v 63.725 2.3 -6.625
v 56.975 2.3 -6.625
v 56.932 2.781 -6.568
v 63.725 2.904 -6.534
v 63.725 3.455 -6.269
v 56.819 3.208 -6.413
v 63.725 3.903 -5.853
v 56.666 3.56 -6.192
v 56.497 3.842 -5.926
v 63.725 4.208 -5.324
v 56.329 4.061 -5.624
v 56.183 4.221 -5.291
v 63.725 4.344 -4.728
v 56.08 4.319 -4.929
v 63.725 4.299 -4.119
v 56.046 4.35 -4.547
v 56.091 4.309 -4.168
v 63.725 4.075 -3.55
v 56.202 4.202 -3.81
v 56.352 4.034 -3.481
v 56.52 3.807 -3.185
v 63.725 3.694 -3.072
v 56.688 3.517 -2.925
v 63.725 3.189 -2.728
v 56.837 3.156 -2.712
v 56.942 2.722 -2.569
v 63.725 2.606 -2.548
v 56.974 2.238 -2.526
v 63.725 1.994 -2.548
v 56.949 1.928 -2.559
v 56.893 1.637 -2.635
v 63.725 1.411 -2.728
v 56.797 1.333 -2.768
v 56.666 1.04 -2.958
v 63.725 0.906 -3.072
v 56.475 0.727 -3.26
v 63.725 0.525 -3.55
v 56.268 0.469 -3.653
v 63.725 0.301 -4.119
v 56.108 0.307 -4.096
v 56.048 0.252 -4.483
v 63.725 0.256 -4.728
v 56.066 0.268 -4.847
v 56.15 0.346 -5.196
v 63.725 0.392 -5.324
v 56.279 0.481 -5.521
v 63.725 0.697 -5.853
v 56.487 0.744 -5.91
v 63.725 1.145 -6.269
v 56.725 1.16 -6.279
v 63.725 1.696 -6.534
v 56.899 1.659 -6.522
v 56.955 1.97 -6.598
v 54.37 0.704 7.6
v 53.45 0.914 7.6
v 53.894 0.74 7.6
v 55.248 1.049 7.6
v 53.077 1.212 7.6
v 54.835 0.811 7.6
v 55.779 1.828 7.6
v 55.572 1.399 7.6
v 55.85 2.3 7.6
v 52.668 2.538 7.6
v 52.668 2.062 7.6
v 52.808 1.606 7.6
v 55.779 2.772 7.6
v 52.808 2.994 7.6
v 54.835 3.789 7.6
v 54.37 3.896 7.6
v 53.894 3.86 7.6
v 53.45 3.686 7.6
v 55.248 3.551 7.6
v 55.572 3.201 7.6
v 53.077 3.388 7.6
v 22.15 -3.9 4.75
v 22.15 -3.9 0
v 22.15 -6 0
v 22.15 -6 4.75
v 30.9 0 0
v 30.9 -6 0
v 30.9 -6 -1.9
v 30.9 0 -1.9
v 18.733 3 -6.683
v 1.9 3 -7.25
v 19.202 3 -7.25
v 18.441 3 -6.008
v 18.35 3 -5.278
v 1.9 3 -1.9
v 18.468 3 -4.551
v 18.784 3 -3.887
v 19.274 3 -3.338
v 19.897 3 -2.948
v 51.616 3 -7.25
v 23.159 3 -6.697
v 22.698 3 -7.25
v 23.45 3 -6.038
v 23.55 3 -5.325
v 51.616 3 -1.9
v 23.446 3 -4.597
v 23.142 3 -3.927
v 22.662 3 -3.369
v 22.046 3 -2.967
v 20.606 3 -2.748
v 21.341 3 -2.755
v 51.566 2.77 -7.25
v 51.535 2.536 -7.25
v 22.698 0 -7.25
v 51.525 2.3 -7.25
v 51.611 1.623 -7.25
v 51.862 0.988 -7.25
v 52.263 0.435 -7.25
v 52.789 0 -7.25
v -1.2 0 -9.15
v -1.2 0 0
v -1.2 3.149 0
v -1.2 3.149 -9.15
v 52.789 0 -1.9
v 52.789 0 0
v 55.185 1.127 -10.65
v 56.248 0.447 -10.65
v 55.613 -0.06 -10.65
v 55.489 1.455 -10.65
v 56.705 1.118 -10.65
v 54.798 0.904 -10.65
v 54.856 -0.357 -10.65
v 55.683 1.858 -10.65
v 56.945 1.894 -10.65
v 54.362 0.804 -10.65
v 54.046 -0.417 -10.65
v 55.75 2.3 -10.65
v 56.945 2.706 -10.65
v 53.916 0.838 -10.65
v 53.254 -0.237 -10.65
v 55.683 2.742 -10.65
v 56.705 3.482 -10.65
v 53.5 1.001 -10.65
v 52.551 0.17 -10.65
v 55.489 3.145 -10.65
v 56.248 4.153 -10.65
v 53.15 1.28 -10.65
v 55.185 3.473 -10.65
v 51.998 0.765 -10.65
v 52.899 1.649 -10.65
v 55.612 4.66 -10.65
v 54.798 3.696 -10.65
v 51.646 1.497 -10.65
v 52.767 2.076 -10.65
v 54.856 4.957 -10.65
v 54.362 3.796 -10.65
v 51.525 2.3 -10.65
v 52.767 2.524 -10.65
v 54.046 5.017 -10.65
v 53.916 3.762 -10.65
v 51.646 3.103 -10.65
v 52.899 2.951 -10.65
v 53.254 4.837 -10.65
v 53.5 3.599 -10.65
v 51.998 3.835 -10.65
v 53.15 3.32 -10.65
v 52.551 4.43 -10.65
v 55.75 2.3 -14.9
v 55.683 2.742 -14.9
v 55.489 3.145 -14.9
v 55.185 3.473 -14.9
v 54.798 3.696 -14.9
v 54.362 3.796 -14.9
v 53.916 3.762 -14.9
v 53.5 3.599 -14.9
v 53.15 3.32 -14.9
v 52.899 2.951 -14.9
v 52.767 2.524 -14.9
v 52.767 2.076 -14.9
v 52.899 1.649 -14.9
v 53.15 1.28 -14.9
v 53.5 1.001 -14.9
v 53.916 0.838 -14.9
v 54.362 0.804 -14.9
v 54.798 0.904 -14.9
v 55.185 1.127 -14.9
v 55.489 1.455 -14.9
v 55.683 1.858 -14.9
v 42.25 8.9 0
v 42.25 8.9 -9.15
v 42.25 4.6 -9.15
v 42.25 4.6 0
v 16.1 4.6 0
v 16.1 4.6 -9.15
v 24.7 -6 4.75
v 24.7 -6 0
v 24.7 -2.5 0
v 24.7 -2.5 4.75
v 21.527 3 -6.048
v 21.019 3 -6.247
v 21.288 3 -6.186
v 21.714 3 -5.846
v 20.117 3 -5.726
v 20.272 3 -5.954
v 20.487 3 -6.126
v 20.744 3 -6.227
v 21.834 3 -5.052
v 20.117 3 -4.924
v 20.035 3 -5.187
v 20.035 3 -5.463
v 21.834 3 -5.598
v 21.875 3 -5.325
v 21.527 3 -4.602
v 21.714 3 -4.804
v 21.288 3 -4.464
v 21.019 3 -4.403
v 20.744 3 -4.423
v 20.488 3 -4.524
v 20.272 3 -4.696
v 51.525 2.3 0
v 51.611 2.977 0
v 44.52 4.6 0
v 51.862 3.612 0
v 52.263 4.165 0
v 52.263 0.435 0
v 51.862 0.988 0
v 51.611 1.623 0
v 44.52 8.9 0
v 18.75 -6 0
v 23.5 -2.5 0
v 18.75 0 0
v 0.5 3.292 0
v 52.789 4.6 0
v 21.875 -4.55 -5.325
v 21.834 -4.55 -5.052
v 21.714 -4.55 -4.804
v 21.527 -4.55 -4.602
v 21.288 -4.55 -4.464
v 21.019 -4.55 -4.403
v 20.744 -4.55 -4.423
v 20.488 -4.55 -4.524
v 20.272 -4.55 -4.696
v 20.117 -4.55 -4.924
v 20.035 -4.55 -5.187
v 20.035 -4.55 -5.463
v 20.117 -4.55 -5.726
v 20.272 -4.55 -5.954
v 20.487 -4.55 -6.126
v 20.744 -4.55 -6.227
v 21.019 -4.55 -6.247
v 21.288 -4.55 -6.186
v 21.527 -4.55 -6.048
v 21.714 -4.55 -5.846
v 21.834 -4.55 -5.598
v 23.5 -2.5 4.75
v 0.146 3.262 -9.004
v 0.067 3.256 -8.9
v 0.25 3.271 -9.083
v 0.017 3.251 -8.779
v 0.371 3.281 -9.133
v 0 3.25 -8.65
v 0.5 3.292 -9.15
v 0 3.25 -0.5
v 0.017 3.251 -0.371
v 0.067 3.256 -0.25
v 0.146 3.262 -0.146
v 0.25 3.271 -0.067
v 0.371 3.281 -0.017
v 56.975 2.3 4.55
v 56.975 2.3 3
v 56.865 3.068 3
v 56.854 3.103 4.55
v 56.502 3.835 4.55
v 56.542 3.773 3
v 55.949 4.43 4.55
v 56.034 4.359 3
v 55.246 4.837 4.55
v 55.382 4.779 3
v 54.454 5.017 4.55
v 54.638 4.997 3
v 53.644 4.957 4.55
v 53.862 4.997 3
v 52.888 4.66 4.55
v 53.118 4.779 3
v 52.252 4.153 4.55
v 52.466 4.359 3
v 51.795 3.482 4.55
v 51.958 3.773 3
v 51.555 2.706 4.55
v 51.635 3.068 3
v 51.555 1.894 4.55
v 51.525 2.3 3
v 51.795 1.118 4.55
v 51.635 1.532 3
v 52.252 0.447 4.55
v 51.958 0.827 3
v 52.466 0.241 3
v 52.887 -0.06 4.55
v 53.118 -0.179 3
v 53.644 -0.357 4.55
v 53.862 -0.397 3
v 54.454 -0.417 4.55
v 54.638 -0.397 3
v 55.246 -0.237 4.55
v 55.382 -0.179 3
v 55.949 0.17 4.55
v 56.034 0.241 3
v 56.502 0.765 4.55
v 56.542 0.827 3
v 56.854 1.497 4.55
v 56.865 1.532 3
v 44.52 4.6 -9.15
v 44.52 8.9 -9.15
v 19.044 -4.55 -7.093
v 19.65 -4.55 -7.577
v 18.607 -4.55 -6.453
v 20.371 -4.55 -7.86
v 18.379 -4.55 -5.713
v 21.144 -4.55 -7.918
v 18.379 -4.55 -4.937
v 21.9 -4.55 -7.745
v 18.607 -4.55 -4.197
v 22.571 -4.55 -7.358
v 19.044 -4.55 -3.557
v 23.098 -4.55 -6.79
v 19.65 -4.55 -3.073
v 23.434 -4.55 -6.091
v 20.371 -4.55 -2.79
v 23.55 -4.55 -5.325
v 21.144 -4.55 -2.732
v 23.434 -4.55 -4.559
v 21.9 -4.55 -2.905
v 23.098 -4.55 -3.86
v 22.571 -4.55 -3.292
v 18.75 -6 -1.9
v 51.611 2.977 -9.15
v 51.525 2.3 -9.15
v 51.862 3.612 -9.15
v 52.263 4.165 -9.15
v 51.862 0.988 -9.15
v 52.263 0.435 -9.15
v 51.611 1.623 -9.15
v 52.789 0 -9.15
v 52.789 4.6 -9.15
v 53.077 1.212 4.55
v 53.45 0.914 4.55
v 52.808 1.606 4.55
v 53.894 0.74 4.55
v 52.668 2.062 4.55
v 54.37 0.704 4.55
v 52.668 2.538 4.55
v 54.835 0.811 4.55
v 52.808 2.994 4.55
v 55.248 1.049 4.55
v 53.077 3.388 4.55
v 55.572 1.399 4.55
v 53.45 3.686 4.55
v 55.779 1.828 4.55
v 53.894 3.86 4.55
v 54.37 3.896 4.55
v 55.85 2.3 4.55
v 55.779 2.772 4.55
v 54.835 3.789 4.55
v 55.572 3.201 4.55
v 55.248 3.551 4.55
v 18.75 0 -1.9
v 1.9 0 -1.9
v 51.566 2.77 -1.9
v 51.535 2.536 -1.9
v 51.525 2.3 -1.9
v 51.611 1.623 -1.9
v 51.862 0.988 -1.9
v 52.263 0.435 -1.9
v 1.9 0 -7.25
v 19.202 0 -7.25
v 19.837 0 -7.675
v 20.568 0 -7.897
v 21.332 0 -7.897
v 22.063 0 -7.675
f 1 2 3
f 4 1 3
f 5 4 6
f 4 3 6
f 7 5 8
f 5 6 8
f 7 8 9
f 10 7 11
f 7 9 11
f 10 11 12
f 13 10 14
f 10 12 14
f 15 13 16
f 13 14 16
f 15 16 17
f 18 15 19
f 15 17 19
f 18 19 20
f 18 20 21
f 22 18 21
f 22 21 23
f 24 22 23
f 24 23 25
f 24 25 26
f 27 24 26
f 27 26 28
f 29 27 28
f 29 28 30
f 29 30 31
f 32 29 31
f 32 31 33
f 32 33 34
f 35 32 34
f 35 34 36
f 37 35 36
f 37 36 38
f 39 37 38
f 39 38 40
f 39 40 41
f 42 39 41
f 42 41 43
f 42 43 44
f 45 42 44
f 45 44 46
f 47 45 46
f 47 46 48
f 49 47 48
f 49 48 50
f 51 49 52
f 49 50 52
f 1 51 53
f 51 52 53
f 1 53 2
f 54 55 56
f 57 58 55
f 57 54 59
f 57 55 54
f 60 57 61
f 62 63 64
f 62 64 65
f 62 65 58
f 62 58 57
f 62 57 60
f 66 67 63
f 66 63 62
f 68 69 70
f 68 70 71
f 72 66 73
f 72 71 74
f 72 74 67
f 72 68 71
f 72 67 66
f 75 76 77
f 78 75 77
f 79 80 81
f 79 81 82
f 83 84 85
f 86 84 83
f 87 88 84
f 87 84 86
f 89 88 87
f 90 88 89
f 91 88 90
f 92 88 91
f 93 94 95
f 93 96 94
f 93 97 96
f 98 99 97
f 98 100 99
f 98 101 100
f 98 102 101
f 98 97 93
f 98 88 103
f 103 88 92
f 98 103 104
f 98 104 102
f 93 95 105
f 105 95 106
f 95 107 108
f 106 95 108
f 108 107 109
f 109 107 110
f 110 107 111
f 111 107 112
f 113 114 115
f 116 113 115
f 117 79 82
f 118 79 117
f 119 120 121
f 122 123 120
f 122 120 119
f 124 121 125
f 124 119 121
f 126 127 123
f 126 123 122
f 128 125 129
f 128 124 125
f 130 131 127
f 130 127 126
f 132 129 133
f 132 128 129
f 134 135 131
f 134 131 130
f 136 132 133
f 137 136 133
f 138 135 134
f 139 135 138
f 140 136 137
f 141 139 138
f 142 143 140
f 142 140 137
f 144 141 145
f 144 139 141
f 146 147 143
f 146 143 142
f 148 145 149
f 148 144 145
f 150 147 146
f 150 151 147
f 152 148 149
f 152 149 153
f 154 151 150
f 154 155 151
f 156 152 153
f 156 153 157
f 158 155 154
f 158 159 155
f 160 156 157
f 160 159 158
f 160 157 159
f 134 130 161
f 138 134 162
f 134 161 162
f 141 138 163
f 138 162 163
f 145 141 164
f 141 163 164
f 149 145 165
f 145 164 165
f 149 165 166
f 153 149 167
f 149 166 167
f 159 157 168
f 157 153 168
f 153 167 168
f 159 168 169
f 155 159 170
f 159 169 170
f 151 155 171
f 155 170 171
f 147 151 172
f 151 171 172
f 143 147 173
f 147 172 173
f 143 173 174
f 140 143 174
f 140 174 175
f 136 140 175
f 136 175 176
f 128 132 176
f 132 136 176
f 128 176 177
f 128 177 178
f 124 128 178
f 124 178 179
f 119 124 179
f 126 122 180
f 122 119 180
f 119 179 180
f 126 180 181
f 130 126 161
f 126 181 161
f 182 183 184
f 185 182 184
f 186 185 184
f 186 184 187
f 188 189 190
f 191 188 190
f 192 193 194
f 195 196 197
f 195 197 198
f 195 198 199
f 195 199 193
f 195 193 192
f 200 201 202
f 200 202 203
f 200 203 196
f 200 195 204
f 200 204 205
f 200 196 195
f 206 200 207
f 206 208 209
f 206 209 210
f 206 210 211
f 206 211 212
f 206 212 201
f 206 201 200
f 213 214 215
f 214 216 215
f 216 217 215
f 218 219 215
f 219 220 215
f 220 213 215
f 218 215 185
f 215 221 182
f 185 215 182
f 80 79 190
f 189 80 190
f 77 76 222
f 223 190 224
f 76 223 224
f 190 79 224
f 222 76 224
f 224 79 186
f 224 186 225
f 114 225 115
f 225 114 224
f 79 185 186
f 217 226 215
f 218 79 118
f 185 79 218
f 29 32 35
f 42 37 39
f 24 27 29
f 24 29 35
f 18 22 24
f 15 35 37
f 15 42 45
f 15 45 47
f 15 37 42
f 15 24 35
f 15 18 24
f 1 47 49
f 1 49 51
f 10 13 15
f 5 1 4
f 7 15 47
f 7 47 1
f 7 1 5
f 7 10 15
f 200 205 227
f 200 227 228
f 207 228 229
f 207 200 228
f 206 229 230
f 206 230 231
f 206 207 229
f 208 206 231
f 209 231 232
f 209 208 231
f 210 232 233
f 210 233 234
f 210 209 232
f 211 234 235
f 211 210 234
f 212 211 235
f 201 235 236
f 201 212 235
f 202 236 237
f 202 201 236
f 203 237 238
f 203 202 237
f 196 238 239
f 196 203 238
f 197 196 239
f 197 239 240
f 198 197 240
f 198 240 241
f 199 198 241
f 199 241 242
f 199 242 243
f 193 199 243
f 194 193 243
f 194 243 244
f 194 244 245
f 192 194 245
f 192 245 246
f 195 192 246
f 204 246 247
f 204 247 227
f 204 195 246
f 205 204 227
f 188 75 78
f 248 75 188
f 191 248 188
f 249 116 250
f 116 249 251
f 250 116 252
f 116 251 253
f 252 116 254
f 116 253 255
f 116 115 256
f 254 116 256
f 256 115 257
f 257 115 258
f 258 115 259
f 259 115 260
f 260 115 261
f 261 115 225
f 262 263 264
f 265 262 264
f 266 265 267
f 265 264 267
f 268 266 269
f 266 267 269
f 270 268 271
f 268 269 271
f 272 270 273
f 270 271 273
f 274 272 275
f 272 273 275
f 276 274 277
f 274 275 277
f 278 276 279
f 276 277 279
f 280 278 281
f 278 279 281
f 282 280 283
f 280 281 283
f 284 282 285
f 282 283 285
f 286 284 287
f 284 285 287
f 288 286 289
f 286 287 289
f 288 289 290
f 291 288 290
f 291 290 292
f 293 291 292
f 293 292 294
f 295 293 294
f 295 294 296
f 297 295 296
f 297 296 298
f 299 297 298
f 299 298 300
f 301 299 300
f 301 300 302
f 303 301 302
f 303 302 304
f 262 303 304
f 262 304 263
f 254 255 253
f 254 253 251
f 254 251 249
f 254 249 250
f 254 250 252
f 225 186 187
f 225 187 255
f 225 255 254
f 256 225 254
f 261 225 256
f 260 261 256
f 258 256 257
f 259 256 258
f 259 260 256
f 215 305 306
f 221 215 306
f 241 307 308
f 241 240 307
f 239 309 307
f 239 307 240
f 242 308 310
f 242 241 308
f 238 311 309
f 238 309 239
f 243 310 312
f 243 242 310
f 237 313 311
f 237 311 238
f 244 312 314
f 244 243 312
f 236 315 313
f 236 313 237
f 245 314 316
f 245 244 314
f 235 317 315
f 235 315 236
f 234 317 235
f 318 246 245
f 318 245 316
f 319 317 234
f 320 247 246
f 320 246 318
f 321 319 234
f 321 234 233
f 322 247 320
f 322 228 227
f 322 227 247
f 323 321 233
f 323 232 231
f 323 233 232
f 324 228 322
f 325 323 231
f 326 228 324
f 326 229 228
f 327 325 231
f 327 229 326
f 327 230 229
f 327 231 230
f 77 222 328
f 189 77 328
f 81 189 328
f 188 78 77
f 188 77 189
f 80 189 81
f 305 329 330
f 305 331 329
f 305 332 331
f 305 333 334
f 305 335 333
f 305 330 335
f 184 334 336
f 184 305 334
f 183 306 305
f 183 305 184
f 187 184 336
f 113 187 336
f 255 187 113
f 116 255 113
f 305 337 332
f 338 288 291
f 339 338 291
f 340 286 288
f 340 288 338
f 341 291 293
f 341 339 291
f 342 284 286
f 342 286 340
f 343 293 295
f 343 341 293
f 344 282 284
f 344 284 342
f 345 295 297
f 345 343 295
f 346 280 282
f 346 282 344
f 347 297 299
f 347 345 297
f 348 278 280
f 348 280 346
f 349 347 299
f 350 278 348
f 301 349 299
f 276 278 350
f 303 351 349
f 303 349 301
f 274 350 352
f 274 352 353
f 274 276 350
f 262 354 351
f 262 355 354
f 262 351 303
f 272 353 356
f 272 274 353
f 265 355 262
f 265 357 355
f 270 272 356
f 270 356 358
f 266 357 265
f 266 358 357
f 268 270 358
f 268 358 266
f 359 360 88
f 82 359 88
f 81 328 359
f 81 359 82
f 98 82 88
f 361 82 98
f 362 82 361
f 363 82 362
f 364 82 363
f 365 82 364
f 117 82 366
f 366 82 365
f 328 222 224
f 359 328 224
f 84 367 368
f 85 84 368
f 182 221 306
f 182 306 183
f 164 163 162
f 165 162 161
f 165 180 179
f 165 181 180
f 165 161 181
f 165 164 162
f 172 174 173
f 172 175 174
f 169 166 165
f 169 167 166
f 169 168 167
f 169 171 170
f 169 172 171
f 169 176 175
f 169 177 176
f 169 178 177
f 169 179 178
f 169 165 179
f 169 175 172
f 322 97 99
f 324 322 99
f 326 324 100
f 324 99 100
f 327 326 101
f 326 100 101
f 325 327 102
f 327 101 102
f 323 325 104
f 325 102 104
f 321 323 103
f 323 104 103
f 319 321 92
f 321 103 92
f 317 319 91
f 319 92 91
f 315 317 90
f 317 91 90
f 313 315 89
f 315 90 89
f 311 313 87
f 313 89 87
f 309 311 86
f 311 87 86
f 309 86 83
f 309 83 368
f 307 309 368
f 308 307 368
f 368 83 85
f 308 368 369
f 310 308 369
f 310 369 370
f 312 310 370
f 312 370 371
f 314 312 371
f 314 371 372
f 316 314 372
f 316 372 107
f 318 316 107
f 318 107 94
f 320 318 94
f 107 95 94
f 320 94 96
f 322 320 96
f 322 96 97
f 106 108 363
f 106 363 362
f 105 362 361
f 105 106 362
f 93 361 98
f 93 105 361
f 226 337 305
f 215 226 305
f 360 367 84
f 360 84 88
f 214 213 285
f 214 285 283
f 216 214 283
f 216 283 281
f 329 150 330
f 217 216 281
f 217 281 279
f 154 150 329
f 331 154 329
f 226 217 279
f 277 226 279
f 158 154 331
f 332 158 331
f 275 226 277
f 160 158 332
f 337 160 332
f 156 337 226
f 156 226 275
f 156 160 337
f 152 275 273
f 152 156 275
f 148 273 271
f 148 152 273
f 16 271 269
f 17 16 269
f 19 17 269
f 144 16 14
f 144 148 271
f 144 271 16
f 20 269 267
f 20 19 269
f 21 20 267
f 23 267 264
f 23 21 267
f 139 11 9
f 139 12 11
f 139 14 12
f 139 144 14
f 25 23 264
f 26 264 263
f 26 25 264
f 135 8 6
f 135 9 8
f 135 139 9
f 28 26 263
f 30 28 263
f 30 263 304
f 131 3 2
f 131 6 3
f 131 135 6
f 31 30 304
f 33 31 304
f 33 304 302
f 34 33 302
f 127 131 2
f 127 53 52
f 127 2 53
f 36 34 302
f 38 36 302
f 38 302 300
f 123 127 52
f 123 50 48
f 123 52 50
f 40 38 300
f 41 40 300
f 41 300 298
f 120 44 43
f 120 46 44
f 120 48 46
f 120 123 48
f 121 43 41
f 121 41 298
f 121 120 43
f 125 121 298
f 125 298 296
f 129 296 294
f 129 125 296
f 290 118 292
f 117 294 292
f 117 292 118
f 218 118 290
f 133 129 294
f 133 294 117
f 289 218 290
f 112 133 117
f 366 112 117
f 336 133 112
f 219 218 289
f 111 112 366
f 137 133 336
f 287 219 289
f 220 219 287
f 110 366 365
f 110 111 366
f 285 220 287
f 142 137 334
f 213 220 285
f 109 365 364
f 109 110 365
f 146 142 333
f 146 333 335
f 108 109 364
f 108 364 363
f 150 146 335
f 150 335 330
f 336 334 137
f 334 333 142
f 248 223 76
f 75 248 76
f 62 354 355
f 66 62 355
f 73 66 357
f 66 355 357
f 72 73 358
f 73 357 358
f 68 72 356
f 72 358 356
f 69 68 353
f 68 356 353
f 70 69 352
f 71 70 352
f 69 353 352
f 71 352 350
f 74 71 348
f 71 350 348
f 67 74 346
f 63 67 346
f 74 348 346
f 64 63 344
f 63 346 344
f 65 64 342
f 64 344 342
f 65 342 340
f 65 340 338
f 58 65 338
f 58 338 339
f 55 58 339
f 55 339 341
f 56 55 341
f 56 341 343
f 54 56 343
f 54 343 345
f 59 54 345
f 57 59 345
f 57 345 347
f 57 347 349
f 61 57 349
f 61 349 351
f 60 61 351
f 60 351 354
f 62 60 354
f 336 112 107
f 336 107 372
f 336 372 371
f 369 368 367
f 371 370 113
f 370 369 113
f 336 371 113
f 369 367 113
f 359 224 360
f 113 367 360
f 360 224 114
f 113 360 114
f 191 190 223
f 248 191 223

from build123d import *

# Parameters (mm, degrees)
BOSS_EXTRUDE1_DEPTH  = 9.15
SKETCH4_W            = 52.35
SKETCH4_H            = 5.35
CUT_EXTRUDE2_DEPTH   = 3
SKETCH6_R            = 2.725
BOSS_EXTRUDE2_DEPTH  = 13.65
SKETCH8_R            = 1.5
BOSS_EXTRUDE3_DEPTH  = 8.75
SKETCH9_R            = 1.6
BOSS_EXTRUDE4_DEPTH  = 4.6
SKETCH10_R           = 2.6
SKETCH10_R_2         = 0.925
BOSS_EXTRUDE5_DEPTH  = 7.55
SKETCH11_W           = 12.15
SKETCH11_H           = 6
BOSS_EXTRUDE6_DEPTH  = 1.9
BOSS_EXTRUDE7_DEPTH  = 4.75
SKETCH13_R           = 2.05
BOSS_EXTRUDE8_DEPTH  = 9.425
FILLET1_R            = 0.5
BOSS_EXTRUDE9_DEPTH  = 9.15
SKETCH20_R           = 2.725
BOSS_EXTRUDE10_DEPTH = 1.55
SKETCH21_R           = 1.5
CUT_EXTRUDE3_DEPTH   = 3


with BuildPart() as part:
    # Sketch1 → Boss-Extrude1 (new body)
    with BuildSketch(Plane.XY):
        Polygon((0, 0), (54.25, 0), (54.25, 4.6), (44.52, 4.6), (44.52, 8.9), (42.25, 8.9), (42.25, 4.6), (16.1, 4.6), (0, 3.25), align=None)
    extrude(amount=-BOSS_EXTRUDE1_DEPTH)

    # Sketch4 → Cut-Extrude2 (cut)
    with BuildSketch(Plane.XZ):
        with Locations((28.075, -4.575)):
            Rectangle(SKETCH4_W, SKETCH4_H)
    extrude(amount=-CUT_EXTRUDE2_DEPTH, mode=Mode.SUBTRACT)

    # Sketch6 → Boss-Extrude2 (add)
    with BuildSketch(Plane(origin=(0, 0, -10.65), x_dir=(-1, 0, 0), z_dir=(0, 0, -1))):
        with Locations((-54.25, 2.3)):
            Circle(SKETCH6_R)
    extrude(amount=-BOSS_EXTRUDE2_DEPTH)

    # Sketch8 → Boss-Extrude3 (add)
    with BuildSketch(Plane.XY.offset(-17.9)):
        with Locations((54.25, 2.3)):
            Circle(SKETCH8_R)
    extrude(amount=BOSS_EXTRUDE3_DEPTH)

    # Sketch9 → Boss-Extrude4 (add)
    with BuildSketch(Plane.XY.offset(3)):
        with Locations((54.25, 2.3)):
            Circle(SKETCH9_R)
    extrude(amount=BOSS_EXTRUDE4_DEPTH)

    # Sketch10 → Boss-Extrude5 (add)
    with BuildSketch(Plane.XZ.offset(-3)):
        with Locations((20.95, -5.325)):
            Circle(SKETCH10_R)
        with Locations((20.95, -5.325)):
            Circle(SKETCH10_R_2, mode=Mode.SUBTRACT)
    extrude(amount=BOSS_EXTRUDE5_DEPTH)

    # Sketch11 → Boss-Extrude6 (add)
    with BuildSketch(Plane.XY):
        with Locations((24.825, -3)):
            Rectangle(SKETCH11_W, SKETCH11_H)
    extrude(amount=-BOSS_EXTRUDE6_DEPTH)

    # Sketch12 → Boss-Extrude7 (add)
    with BuildSketch(Plane.XY):
        Polygon((24.7, -6), (24.7, -2.5), (23.5, -2.5), (22.15, -3.9), (22.15, -6), align=None)
    extrude(amount=BOSS_EXTRUDE7_DEPTH)

    # Sketch13 → Boss-Extrude8 (add)
    with BuildSketch(Plane(origin=(54.3, 0, 0), x_dir=(0, 0, -1), z_dir=(1, 0, 0))):
        with Locations((4.575, 2.3)):
            Circle(SKETCH13_R)
    extrude(amount=BOSS_EXTRUDE8_DEPTH)

    # Fillet1
    fillet1_edges = [part.edges().sort_by_distance(p)[0] for p in [
        (0, 1.625, 0),
        (0, 1.625, -9.15),
    ]]
    fillet(fillet1_edges, radius=FILLET1_R)

    # Sketch19 → Boss-Extrude9 (add)
    with BuildSketch(Plane.XY):
        Polygon((0.5, 0), (-1.2, 0), (-1.2, 3.149378882), (0.5, 3.291925466), align=None)
    extrude(amount=-BOSS_EXTRUDE9_DEPTH)

    # Sketch20 → Boss-Extrude10 (add)
    with BuildSketch(Plane.XY.offset(3)):
        with Locations((54.25, 2.3)):
            Circle(SKETCH20_R)
    extrude(amount=BOSS_EXTRUDE10_DEPTH)

    # Sketch21 → Cut-Extrude3 (cut)
    with BuildSketch(Plane(origin=(0, 0, -17.9), x_dir=(-1, 0, 0), z_dir=(0, 0, -1))):
        with Locations((-54.25, 2.3)):
            Circle(SKETCH21_R)
    extrude(amount=-CUT_EXTRUDE3_DEPTH, mode=Mode.SUBTRACT)


solid = part.part
